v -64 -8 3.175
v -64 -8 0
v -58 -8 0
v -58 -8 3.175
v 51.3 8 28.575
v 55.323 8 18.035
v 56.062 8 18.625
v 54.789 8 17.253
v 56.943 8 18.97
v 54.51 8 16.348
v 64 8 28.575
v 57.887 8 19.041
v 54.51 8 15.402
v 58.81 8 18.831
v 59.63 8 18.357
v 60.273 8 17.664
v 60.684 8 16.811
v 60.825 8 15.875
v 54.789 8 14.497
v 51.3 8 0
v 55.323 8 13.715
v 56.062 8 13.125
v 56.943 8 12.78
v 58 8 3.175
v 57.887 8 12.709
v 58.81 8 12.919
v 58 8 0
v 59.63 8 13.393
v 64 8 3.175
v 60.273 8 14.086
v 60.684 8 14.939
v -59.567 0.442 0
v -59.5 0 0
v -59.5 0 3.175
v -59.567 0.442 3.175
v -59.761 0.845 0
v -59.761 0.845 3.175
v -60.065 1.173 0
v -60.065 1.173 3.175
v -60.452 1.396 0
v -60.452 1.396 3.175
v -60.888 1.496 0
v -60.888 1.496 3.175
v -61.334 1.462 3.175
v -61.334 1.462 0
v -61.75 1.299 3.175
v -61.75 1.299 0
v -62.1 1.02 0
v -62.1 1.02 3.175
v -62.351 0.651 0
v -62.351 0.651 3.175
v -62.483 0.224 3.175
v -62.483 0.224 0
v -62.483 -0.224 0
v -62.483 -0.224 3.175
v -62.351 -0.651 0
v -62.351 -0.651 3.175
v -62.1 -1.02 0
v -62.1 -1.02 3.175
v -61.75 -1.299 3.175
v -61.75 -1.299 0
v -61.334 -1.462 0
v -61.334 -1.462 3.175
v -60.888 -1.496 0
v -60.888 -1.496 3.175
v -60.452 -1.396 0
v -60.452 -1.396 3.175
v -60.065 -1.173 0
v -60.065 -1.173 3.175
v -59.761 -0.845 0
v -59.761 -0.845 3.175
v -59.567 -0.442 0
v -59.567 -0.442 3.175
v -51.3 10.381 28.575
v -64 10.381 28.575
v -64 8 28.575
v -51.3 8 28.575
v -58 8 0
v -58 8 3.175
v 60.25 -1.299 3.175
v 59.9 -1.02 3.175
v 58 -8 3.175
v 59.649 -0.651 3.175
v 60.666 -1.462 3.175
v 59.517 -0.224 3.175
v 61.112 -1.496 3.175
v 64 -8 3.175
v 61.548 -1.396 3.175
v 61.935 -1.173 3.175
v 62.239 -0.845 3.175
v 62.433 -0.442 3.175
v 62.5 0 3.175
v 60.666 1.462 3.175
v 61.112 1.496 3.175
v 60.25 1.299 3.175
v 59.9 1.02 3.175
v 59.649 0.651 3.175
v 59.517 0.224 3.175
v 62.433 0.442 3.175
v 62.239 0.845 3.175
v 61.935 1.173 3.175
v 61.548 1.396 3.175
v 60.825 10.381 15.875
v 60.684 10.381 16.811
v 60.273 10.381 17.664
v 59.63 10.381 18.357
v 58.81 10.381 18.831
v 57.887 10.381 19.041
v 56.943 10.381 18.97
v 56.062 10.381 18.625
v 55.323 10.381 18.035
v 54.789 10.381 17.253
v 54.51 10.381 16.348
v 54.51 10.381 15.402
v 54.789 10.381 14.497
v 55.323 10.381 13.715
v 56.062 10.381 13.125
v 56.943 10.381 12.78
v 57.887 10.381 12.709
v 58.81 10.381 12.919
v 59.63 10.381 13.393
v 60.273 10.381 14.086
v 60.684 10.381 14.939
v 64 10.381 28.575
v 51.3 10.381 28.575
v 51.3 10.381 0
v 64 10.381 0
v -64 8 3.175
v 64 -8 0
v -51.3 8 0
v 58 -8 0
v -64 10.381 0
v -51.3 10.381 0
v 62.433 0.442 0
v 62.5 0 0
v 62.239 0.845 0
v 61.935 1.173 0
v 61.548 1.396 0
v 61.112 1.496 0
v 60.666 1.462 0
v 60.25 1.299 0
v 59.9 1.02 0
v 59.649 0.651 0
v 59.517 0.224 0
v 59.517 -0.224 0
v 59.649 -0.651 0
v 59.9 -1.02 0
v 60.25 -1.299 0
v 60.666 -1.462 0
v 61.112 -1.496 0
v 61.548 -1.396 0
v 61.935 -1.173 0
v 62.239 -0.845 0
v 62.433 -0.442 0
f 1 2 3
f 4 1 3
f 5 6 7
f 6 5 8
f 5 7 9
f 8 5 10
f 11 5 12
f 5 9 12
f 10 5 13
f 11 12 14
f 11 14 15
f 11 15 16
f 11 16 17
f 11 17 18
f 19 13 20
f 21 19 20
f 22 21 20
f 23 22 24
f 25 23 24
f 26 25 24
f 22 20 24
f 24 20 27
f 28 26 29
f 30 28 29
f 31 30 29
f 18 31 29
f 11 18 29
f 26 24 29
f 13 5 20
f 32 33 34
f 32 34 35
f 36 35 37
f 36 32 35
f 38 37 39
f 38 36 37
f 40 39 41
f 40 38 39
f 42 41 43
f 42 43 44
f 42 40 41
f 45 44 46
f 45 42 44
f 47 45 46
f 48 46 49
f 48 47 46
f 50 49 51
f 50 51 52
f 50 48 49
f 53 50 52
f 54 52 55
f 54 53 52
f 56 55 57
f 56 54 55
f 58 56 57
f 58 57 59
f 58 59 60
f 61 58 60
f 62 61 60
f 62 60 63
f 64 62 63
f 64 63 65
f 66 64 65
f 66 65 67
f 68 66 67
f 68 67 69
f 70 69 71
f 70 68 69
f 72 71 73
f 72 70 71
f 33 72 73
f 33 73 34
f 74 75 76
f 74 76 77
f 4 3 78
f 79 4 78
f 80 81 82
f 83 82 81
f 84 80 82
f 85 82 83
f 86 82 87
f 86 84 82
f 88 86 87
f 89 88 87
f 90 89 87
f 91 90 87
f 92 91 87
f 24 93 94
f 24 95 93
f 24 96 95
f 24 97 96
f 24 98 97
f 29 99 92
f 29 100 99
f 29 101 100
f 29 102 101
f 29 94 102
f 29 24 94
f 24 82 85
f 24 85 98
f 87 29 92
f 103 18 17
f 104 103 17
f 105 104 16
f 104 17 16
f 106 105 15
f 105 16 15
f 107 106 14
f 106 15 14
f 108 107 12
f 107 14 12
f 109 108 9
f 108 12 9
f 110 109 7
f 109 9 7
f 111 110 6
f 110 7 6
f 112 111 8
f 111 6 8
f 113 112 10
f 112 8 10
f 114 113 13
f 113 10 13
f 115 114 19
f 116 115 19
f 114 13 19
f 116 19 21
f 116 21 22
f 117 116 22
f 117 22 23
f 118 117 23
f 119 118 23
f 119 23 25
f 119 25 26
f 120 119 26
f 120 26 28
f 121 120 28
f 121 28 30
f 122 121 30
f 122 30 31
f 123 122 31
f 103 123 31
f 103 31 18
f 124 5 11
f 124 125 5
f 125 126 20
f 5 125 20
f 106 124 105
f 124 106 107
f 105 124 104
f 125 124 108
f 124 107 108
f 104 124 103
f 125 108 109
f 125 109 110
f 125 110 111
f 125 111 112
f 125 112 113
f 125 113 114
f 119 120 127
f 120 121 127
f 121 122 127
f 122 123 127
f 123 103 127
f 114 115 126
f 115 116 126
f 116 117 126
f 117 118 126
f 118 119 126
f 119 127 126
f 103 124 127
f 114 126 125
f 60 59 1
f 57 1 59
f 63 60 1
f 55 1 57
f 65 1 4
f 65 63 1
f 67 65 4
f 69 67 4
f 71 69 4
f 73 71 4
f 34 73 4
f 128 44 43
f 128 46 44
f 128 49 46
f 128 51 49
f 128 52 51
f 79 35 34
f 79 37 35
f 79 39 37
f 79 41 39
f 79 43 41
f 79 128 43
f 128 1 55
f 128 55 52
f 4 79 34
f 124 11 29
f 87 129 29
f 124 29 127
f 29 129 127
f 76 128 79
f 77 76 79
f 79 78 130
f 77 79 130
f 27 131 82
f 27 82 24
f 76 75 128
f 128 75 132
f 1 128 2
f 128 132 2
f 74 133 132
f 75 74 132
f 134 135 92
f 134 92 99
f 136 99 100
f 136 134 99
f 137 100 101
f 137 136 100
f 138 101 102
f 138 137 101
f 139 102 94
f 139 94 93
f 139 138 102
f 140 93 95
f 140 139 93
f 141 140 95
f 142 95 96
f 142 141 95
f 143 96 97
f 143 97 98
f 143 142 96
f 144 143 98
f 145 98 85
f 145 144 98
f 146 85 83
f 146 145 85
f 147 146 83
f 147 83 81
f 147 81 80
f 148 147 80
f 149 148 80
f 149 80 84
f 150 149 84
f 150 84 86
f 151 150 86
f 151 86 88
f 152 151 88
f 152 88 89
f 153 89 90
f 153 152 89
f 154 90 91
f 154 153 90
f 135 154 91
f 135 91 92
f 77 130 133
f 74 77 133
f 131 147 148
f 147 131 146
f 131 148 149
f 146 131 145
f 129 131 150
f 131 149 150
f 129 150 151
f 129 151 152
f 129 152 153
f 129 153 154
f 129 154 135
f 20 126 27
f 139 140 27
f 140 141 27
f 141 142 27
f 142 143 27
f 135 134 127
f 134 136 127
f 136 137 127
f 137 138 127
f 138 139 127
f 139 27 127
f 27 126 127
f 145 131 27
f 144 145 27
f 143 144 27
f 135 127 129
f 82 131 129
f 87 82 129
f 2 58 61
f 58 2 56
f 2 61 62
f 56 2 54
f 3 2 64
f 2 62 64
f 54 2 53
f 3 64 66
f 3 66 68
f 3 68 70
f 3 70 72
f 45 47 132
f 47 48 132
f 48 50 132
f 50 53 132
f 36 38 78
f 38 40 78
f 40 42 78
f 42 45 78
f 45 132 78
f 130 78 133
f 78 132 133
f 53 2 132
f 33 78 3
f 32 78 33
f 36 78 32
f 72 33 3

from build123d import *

# Parameters (mm, degrees)
F0_W     = 6
F0_H     = 16
F0_R     = 1.5
F1_DEPTH = 3.175
F2_DEPTH = 28.575
F3_R     = 3.175
F4_DEPTH = 2.38225


# Not quite as in the source:
# - a length typed as a fraction of an inch, garbled in the dataset ("3 / 203.2 mm" for 3/8 in), is restored


with BuildPart() as f1:
    # F0 (on Top) → F1 (new body)
    with BuildSketch(Plane.XY):
        with Locations((-61, 0)):
            Rectangle(F0_W, F0_H)
        with Locations((-61, 0)):
            Circle(F0_R, mode=Mode.SUBTRACT)
    extrude(amount=F1_DEPTH)

    # F0 (on Top) → F2, piece 2 (join)
    with BuildSketch(Plane.XY):
        Polygon((-64, 10.38125), (-64, 8), (-58, 8), (-51.3, 8), (-51.3, 10.38125), align=None)
    extrude(amount=F2_DEPTH)


with BuildPart() as f1b:
    # F0 (on Top) → F1, piece 2 (new body)
    with BuildSketch(Plane.XY):
        with Locations((61, 0)):
            Rectangle(F0_W, F0_H)
        with Locations((61, 0)):
            Circle(F0_R, mode=Mode.SUBTRACT)
    extrude(amount=F1_DEPTH)

    # F0 (on Top) → F2 (join)
    with BuildSketch(Plane.XY):
        Polygon((51.3, 8), (58, 8), (64, 8), (64, 10.38125), (51.3, 10.38125), align=None)
    extrude(amount=F2_DEPTH)

    # F3 (on face) → F4 (cut, through all)
    with BuildSketch(Plane.XZ.offset(-8)):
        with Locations((57.65, 15.875)):
            Circle(F3_R)
    extrude(amount=-F4_DEPTH, mode=Mode.SUBTRACT)


solid = Compound([f1.part, f1b.part])
